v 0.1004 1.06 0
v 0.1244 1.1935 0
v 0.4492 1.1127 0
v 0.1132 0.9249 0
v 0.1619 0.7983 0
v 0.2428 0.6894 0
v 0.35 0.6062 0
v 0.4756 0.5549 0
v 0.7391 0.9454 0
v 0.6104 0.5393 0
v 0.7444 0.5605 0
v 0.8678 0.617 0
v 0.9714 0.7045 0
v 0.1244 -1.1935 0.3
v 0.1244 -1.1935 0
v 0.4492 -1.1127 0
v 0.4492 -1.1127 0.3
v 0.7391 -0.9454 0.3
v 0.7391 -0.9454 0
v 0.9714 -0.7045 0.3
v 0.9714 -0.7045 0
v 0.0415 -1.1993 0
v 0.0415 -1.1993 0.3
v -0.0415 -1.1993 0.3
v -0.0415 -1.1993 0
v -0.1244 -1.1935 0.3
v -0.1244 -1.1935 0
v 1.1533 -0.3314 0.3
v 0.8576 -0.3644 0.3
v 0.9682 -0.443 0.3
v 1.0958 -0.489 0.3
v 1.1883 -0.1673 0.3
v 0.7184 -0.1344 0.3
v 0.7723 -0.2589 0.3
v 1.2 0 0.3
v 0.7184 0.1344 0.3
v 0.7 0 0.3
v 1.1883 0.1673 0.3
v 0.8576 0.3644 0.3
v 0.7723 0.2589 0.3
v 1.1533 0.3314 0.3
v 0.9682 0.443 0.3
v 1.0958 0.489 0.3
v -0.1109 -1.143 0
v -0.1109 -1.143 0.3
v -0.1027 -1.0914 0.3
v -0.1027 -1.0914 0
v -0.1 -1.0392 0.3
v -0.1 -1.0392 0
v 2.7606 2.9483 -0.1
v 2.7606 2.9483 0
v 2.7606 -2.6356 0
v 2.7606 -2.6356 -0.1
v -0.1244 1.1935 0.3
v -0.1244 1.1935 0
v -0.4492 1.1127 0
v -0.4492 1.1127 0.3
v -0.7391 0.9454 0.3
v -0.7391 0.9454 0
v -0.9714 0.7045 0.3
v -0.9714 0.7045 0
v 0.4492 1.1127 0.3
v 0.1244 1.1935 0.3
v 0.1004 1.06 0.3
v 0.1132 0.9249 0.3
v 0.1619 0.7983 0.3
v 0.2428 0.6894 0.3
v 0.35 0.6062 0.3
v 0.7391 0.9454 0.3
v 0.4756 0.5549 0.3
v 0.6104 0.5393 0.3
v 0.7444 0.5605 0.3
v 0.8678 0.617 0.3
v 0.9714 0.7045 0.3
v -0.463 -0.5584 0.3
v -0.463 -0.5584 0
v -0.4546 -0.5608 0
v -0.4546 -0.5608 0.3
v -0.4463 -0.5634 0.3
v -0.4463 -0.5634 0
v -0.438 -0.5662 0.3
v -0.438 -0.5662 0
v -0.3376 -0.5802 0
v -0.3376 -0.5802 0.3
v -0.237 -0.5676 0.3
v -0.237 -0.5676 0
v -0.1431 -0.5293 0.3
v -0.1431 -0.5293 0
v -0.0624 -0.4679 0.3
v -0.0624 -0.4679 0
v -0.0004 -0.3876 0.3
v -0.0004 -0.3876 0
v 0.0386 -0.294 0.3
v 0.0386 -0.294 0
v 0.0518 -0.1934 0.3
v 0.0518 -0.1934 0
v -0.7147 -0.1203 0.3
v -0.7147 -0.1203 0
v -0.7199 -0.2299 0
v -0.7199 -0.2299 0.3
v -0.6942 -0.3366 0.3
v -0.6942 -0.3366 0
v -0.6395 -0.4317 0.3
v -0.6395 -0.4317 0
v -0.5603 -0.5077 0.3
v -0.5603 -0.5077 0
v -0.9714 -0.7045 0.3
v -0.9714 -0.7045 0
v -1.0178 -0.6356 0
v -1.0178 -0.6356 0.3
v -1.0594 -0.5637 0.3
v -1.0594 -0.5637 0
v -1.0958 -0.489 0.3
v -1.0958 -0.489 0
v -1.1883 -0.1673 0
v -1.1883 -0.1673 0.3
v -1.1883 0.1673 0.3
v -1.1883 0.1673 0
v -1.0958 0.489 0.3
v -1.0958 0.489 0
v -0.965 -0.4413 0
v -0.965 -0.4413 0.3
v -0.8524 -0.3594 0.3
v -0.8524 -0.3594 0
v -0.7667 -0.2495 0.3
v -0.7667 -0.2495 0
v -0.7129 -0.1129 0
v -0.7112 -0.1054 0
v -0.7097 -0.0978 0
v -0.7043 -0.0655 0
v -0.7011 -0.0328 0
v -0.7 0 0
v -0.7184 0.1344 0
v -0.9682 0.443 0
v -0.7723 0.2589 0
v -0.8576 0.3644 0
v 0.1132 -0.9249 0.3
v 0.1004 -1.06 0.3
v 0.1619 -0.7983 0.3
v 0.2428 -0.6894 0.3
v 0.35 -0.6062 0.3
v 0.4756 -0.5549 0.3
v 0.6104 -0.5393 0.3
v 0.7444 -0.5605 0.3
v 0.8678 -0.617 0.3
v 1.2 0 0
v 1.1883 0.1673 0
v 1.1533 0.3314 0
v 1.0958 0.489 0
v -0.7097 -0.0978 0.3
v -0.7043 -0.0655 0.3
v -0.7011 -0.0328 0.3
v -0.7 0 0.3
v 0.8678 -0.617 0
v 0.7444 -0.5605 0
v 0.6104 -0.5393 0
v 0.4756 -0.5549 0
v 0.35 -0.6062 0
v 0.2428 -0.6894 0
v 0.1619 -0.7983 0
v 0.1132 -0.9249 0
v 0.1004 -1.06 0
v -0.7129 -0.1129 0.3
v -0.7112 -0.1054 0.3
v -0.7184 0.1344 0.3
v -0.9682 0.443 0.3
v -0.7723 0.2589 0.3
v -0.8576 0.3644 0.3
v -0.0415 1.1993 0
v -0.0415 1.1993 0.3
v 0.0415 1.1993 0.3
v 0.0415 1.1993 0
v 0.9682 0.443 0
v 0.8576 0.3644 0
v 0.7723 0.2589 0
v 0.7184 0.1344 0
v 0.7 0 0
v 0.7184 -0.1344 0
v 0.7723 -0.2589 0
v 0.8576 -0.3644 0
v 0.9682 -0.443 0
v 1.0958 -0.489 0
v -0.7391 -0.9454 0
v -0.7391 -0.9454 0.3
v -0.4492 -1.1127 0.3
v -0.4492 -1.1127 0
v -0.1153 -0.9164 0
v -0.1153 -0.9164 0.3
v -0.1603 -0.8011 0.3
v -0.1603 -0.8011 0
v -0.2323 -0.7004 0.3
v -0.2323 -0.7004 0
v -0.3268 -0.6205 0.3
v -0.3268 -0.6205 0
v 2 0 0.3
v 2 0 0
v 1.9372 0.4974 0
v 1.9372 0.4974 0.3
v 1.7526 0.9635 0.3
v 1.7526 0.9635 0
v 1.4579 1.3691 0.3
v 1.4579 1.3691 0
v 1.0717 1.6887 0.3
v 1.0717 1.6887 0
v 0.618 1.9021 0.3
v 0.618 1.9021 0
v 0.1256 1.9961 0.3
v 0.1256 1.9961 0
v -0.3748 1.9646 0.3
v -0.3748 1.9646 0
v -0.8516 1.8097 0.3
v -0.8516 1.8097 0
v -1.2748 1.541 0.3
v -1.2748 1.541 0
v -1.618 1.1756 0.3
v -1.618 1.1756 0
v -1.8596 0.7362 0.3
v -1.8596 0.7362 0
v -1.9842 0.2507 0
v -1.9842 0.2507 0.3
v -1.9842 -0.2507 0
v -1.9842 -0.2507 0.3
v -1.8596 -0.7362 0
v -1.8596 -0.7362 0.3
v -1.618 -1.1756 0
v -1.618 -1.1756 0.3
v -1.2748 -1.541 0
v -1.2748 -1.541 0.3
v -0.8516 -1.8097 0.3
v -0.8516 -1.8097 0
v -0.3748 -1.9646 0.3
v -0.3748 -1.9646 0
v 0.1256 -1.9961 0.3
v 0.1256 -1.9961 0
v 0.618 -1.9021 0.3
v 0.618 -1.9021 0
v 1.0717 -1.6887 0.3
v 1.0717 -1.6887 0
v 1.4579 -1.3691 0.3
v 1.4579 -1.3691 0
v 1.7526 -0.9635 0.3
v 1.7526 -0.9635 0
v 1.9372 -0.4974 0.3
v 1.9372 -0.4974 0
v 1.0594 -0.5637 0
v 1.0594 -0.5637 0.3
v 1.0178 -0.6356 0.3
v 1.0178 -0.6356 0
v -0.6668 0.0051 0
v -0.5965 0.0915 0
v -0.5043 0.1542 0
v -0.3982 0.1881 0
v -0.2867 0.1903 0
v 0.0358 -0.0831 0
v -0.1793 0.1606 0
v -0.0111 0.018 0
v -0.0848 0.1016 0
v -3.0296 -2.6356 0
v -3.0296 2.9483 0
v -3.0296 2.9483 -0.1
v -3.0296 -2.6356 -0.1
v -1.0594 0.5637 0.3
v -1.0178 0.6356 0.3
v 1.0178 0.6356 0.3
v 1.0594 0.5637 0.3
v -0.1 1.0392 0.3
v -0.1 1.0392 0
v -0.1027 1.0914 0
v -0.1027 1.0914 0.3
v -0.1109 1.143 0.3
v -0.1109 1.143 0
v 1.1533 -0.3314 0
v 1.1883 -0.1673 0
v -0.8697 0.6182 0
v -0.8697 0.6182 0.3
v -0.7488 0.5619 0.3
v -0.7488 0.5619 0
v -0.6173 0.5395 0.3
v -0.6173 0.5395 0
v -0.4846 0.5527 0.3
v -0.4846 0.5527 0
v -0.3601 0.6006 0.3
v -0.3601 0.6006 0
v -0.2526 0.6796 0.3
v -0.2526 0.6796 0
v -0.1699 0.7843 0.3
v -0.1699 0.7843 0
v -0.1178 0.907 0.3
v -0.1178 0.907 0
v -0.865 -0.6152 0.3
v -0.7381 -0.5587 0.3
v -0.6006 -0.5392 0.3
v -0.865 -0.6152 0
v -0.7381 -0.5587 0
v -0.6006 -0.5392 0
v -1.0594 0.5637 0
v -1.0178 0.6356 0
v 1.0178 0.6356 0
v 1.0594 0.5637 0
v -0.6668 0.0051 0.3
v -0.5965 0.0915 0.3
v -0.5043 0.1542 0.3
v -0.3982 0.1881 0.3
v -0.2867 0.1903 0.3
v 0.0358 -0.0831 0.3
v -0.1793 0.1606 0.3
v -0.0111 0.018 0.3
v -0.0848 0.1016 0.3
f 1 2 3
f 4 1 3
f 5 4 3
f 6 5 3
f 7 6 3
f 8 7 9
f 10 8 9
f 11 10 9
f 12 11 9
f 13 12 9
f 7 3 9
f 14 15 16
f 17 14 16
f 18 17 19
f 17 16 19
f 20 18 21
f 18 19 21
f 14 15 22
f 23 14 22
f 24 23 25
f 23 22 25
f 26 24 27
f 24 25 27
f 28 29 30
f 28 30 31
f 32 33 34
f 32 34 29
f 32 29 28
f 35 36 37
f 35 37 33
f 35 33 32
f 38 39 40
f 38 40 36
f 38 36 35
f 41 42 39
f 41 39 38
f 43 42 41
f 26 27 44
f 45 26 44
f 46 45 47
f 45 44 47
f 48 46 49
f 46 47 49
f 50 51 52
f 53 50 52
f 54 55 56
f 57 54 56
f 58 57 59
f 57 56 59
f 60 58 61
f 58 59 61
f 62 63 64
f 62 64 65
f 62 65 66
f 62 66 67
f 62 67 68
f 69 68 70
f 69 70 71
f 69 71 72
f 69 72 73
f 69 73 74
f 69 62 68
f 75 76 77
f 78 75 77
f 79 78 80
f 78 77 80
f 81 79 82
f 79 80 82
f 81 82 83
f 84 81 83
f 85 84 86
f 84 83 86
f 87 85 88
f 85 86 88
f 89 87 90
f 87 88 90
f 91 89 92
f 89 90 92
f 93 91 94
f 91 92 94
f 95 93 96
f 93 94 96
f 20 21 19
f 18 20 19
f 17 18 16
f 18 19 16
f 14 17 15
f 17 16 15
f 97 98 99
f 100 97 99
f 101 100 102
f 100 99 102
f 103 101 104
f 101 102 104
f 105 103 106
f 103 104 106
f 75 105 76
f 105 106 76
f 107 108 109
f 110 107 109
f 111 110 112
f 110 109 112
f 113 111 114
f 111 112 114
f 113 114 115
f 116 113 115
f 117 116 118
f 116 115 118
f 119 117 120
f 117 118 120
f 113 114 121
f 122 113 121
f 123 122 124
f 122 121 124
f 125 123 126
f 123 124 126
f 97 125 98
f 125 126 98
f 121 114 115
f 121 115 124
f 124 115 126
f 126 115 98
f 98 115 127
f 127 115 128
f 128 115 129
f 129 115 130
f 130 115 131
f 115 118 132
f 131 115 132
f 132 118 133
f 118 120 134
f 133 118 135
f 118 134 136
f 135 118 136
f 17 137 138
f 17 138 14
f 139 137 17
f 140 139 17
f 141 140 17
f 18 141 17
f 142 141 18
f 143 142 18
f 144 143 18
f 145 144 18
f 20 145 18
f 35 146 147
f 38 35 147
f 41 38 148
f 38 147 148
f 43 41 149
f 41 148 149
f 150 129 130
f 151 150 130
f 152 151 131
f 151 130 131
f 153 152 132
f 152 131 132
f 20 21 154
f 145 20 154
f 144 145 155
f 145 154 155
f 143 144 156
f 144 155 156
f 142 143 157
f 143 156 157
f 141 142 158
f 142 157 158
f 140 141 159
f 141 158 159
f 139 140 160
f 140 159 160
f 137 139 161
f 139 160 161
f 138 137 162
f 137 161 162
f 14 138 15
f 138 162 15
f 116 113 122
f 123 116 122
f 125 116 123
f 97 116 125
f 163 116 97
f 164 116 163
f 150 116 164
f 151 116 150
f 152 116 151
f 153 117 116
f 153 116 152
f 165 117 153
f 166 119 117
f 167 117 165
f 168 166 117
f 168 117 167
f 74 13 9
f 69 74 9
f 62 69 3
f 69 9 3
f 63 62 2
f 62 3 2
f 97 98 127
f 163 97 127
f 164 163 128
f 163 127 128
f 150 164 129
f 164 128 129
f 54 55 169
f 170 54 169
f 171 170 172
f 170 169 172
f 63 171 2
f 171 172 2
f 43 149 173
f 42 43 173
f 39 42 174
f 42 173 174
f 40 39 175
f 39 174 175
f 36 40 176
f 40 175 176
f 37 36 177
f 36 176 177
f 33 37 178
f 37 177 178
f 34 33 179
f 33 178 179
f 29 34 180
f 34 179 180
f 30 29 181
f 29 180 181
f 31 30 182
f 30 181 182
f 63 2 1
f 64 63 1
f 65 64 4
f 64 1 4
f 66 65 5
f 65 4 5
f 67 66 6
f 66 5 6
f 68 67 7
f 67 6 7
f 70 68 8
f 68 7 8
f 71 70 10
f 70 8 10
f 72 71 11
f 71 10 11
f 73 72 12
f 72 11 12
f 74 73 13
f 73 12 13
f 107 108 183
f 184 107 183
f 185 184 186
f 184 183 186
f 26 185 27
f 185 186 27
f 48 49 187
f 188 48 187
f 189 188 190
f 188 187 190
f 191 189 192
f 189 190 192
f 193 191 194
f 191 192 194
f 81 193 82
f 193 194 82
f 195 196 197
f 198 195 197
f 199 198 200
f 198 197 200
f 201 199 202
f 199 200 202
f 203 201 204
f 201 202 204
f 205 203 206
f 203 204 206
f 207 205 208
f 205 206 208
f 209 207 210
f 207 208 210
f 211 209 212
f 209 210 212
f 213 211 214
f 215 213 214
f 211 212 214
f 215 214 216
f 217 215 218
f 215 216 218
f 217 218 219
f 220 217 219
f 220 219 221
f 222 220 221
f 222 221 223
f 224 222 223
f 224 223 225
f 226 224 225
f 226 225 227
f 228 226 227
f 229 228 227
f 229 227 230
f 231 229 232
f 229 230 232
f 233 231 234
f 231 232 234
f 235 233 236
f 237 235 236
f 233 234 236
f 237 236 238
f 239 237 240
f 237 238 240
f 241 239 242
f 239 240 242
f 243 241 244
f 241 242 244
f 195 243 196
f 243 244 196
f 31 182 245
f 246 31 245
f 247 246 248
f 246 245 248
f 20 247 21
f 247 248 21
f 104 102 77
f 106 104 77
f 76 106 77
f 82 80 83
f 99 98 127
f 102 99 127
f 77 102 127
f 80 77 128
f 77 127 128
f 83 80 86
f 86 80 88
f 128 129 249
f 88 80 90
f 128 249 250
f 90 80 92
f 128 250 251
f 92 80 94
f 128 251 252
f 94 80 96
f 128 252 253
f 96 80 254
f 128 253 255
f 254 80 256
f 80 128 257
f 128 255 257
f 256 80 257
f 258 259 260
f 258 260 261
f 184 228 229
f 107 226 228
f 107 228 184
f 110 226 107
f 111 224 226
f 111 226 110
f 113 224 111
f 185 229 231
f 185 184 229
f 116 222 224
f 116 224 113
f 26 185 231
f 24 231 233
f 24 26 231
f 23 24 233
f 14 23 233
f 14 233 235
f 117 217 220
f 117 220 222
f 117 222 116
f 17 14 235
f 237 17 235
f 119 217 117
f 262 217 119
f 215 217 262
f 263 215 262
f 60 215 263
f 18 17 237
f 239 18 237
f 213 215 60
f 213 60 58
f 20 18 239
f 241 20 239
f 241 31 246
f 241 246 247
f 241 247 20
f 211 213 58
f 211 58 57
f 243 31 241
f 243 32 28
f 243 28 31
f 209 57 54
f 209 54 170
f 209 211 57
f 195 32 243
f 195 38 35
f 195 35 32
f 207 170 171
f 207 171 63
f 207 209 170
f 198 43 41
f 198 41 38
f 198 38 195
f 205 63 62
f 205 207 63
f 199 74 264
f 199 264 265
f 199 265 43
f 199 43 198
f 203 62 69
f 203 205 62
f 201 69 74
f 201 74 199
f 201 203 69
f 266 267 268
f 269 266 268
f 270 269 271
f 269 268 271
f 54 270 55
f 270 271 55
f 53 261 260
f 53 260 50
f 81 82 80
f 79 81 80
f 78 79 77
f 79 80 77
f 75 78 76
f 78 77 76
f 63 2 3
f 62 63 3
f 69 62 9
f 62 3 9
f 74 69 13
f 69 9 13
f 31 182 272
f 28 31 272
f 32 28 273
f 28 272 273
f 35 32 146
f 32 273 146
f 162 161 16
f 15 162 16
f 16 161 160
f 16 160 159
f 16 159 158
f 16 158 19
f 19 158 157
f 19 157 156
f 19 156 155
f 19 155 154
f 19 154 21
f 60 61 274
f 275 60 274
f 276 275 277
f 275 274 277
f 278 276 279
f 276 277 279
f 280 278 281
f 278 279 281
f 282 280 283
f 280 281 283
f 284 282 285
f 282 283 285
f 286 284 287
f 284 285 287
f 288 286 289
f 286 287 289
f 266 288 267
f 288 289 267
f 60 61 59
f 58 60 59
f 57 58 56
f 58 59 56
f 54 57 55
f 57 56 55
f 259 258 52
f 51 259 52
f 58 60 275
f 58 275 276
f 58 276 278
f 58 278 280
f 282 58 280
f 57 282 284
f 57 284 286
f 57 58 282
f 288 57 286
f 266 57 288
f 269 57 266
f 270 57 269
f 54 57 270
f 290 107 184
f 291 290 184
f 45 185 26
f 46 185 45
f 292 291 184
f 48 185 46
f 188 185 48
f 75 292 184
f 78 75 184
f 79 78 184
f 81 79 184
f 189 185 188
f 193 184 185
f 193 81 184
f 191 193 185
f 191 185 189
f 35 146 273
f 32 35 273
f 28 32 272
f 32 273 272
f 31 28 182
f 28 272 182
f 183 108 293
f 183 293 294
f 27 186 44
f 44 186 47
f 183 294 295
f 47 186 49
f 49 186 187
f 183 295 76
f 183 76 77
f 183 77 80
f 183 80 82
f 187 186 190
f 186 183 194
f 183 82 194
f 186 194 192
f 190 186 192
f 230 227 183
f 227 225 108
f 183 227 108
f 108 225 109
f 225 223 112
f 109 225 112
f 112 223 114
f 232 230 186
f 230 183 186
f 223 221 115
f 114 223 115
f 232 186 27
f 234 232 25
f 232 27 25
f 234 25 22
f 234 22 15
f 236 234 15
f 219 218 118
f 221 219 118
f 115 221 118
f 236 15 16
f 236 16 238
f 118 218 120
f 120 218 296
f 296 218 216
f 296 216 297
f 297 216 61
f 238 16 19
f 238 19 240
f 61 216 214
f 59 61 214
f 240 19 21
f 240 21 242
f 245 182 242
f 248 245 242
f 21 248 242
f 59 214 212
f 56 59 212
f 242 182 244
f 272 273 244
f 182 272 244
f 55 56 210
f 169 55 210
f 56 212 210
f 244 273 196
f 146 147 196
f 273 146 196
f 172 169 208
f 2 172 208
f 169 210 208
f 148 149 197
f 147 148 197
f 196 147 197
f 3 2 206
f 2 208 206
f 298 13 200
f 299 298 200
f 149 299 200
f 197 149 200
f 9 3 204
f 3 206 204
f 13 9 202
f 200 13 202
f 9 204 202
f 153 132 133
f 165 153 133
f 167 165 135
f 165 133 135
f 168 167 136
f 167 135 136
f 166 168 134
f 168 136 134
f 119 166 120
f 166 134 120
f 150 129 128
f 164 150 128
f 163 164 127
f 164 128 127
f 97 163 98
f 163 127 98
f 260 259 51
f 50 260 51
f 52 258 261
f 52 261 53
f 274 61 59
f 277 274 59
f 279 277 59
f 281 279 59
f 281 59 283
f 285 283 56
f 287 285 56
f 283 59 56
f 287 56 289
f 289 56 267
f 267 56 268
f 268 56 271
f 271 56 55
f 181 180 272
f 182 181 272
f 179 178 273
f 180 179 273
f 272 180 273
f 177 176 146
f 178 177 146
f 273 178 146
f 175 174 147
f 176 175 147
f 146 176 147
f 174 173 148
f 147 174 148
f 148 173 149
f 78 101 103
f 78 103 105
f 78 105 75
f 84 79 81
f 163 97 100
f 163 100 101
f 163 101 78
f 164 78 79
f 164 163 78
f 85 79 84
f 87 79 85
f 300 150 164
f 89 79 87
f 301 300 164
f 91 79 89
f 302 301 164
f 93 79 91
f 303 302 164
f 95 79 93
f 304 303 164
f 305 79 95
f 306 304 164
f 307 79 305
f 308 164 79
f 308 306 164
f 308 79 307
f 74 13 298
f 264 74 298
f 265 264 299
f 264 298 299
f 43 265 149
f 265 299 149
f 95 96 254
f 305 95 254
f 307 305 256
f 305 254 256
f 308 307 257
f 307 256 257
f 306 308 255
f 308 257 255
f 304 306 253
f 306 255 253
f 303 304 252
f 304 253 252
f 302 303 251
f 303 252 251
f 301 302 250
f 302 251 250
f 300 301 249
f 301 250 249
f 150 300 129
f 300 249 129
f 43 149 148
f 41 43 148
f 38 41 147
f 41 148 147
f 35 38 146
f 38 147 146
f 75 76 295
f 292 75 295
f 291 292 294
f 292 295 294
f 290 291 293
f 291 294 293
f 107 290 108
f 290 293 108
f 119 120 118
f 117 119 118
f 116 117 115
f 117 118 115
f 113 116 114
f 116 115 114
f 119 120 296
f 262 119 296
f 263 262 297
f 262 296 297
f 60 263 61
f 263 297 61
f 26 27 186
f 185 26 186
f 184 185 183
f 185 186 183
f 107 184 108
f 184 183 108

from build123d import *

# Parameters (mm, degrees)
F1_DEPTH = 0.3
F0_R     = 2
F2_DEPTH = 0.3
F3_DEPTH = 0.3
F5_W     = 5.7901758701
F5_H     = 5.5838446133
F6_DEPTH = 0.1


# Not quite as in the source:
# - a feature of the source that left no trace in its solid (it failed there, or was rolled back) is left out


with BuildPart() as f1:
    # F0 (on Top) → F1 (new body)
    with BuildSketch(Plane.XY):
        with BuildLine():
            ThreePointArc((-0.7096651668, -0.0978353275), (-0.7024221585, -0.04915579), (-0.7, 0))
            ThreePointArc((-0.7, 0), (-0.8113592061, 0.3145764348), (-1.0958333333, 0.4890289414))
            ThreePointArc((-1.0958333333, 0.4890289414), (-1.2, 0), (-1.0958333333, -0.4890289414))
            ThreePointArc((-1.0958333333, -0.4890289414), (-0.8523553963, -0.3593650366), (-0.7146924586, -0.1203187029))
            ThreePointArc((-0.7146924586, -0.1203187029), (-0.7123462626, -0.1090395733), (-0.7096651668, -0.0978353275))
        make_face()
        with BuildLine():
            ThreePointArc((-0.7146924586, -0.1203187029), (-0.7120492993, -0.1091059745), (-0.7096651668, -0.0978353275))
            ThreePointArc((-0.7096651668, -0.0978353275), (-0.7123462626, -0.1090395733), (-0.7146924586, -0.1203187029))
        make_face()
    extrude(amount=F1_DEPTH)


with BuildPart() as f1b:
    # F0 (on Top) → F1, piece 2 (new body)
    with BuildSketch(Plane.XY):
        with BuildLine():
            ThreePointArc((-0.1244051802, 1.1935339757), (-0.6, 1.0392304845), (-0.9714281531, 0.7045050343))
            ThreePointArc((-0.9714281531, 0.7045050343), (-0.420715417, 0.5724789036), (-0.1, 1.0392304845))
            ThreePointArc((-0.1, 1.0392304845), (-0.1061389822, 1.1173412716), (-0.1244051802, 1.1935339757))
        make_face()
    extrude(amount=F1_DEPTH)


with BuildPart() as f1c:
    # F0 (on Top) → F1, piece 3 (new body)
    with BuildSketch(Plane.XY):
        with BuildLine():
            ThreePointArc((-0.46298597, -0.5583696361), (-0.7381172832, -0.5586853607), (-0.9714281531, -0.7045050343))
            ThreePointArc((-0.9714281531, -0.7045050343), (-0.6, -1.0392304845), (-0.1244051802, -1.1935339757))
            ThreePointArc((-0.1244051802, -1.1935339757), (-0.1061389822, -1.1173412716), (-0.1, -1.0392304845))
            ThreePointArc((-0.1, -1.0392304845), (-0.1931954282, -0.748524378), (-0.4380401615, -0.5661881918))
            ThreePointArc((-0.4380401615, -0.5661881918), (-0.4505791453, -0.5624897467), (-0.46298597, -0.5583696361))
        make_face()
        with BuildLine():
            ThreePointArc((-0.4380401615, -0.5661881918), (-0.4504619581, -0.5621158505), (-0.46298597, -0.5583696361))
            ThreePointArc((-0.46298597, -0.5583696361), (-0.4505791453, -0.5624897467), (-0.4380401615, -0.5661881918))
        make_face()
    extrude(amount=F1_DEPTH)


with BuildPart() as f1d:
    # F0 (on Top) → F1, piece 4 (new body)
    with BuildSketch(Plane.XY):
        with BuildLine():
            ThreePointArc((1.1, 1.0392304845), (0.678110787, 1.5330915024), (0.1244051802, 1.1935339757))
            ThreePointArc((0.1244051802, 1.1935339757), (0.6, 1.0392304845), (0.9714281531, 0.7045050343))
            ThreePointArc((0.9714281531, 0.7045050343), (1.0667515809, 0.8599459015), (1.1, 1.0392304845))
        make_face()
    extrude(amount=F1_DEPTH)



with BuildPart() as f1e:
    # F0 (on Top) → F1, piece 5 (new body)
    with BuildSketch(Plane.XY):
        with BuildLine():
            ThreePointArc((0.9714281531, -0.7045050343), (0.6, -1.0392304845), (0.1244051802, -1.1935339757))
            ThreePointArc((0.1244051802, -1.1935339757), (0.678110787, -1.5330915024), (1.1, -1.0392304845))
            ThreePointArc((1.1, -1.0392304845), (1.0667515809, -0.8599459015), (0.9714281531, -0.7045050343))
        make_face()
    extrude(amount=F1_DEPTH)


with BuildPart() as f1f:
    # F0 (on Top) → F1, piece 6 (new body)
    with BuildSketch(Plane.XY):
        with BuildLine():
            ThreePointArc((1.2, 0), (1.1736694594, 0.25), (1.0958333333, 0.4890289414))
            ThreePointArc((1.0958333333, 0.4890289414), (0.7, 0), (1.0958333333, -0.4890289414))
            ThreePointArc((1.0958333333, -0.4890289414), (1.1736694594, -0.25), (1.2, 0))
        make_face()
    extrude(amount=F1_DEPTH)


with BuildPart() as f1d_1:
    add(f1d.part)

    add(f1e.part)  # F2 merges F1e
    # F0 (on Top) → F2 (join)
    with BuildSketch(Plane.XY):
        Circle(F0_R)
        with BuildLine():
            ThreePointArc((-1.0958333333, -0.4890289414), (-1.7, 0), (-1.0958333333, 0.4890289414))
            ThreePointArc((-1.0958333333, 0.4890289414), (-1.0392304845, 0.6), (-0.9714281531, 0.7045050343))
            ThreePointArc((-0.9714281531, 0.7045050343), (-0.85, 1.4722431864), (-0.1244051802, 1.1935339757))
            ThreePointArc((-0.1244051802, 1.1935339757), (0, 1.2), (0.1244051802, 1.1935339757))
            ThreePointArc((0.1244051802, 1.1935339757), (0.678110787, 1.5330915024), (1.1, 1.0392304845))
            ThreePointArc((1.1, 1.0392304845), (1.0667515809, 0.8599459015), (0.9714281531, 0.7045050343))
            ThreePointArc((0.9714281531, 0.7045050343), (1.0392304845, 0.6), (1.0958333333, 0.4890289414))
            ThreePointArc((1.0958333333, 0.4890289414), (1.5145764348, 0.3886407939), (1.7, 0))
            ThreePointArc((1.7, 0), (1.5145764348, -0.3886407939), (1.0958333333, -0.4890289414))
            ThreePointArc((1.0958333333, -0.4890289414), (1.0392304845, -0.6), (0.9714281531, -0.7045050343))
            ThreePointArc((0.9714281531, -0.7045050343), (1.0667515809, -0.8599459015), (1.1, -1.0392304845))
            ThreePointArc((1.1, -1.0392304845), (0.678110787, -1.5330915024), (0.1244051802, -1.1935339757))
            ThreePointArc((0.1244051802, -1.1935339757), (0, -1.2), (-0.1244051802, -1.1935339757))
            ThreePointArc((-0.1244051802, -1.1935339757), (-0.85, -1.4722431864), (-0.9714281531, -0.7045050343))
            ThreePointArc((-0.9714281531, -0.7045050343), (-1.0392304845, -0.6), (-1.0958333333, -0.4890289414))
        make_face(mode=Mode.SUBTRACT)
        with BuildLine():
            ThreePointArc((-1.0958333333, -0.4890289414), (-1.2, 0), (-1.0958333333, 0.4890289414))
            ThreePointArc((-1.0958333333, 0.4890289414), (-1.7, 0), (-1.0958333333, -0.4890289414))
        make_face()
        with BuildLine():
            ThreePointArc((-0.1244051802, -1.1935339757), (-0.6, -1.0392304845), (-0.9714281531, -0.7045050343))
            ThreePointArc((-0.9714281531, -0.7045050343), (-0.85, -1.4722431864), (-0.1244051802, -1.1935339757))
        make_face()
        with BuildLine():
            ThreePointArc((1.7, 0), (1.5145764348, 0.3886407939), (1.0958333333, 0.4890289414))
            ThreePointArc((1.0958333333, 0.4890289414), (1.1736694594, 0.25), (1.2, 0))
            ThreePointArc((1.2, 0), (1.1736694594, -0.25), (1.0958333333, -0.4890289414))
            ThreePointArc((1.0958333333, -0.4890289414), (1.5145764348, -0.3886407939), (1.7, 0))
        make_face()
        with BuildLine():
            ThreePointArc((-0.1244051802, 1.1935339757), (-0.85, 1.4722431864), (-0.9714281531, 0.7045050343))
            ThreePointArc((-0.9714281531, 0.7045050343), (-0.6, 1.0392304845), (-0.1244051802, 1.1935339757))
        make_face()
    extrude(amount=F2_DEPTH)


with BuildPart() as f2:
    # F0 (on Top) → F2, piece 2 (new body)
    with BuildSketch(Plane.XY):
        with BuildLine():
            ThreePointArc((0.9714281531, -0.7045050343), (0.35, -0.6062177826), (0.1244051802, -1.1935339757))
            ThreePointArc((0.1244051802, -1.1935339757), (0.6, -1.0392304845), (0.9714281531, -0.7045050343))
        make_face()
    extrude(amount=F2_DEPTH)


with BuildPart() as f2b:
    # F0 (on Top) → F2, piece 3 (new body)
    with BuildSketch(Plane.XY):
        with BuildLine():
            ThreePointArc((0.9714281531, 0.7045050343), (0.6, 1.0392304845), (0.1244051802, 1.1935339757))
            ThreePointArc((0.1244051802, 1.1935339757), (0.35, 0.6062177826), (0.9714281531, 0.7045050343))
        make_face()
    extrude(amount=F2_DEPTH)


with BuildPart() as f3:
    # F0 (on Top) → F3 (new body)
    with BuildSketch(Plane.XY):
        with BuildLine():
            ThreePointArc((0.0518479844, -0.1934346327), (-0.2867344533, 0.1903105649), (-0.7096651668, -0.0978353275))
            ThreePointArc((-0.7096651668, -0.0978353275), (-0.7120492993, -0.1091059745), (-0.7146924586, -0.1203187029))
            ThreePointArc((-0.7146924586, -0.1203187029), (-0.6702487628, -0.3861225462), (-0.46298597, -0.5583696361))
            ThreePointArc((-0.46298597, -0.5583696361), (-0.4504619581, -0.5621158505), (-0.4380401615, -0.5661881918))
            ThreePointArc((-0.4380401615, -0.5661881918), (-0.1007143125, -0.5012233635), (0.0518479844, -0.1934346327))
        make_face()
    extrude(amount=F3_DEPTH)


with BuildPart() as f6:
    # F5 (on face) → F6 (new body)
    with BuildSketch(Plane(origin=(0, 0, 0), x_dir=(1, 0, 0), z_dir=(0, 0, -1))):
        with Locations((-0.1344780903, -0.1563602127)):
            Rectangle(F5_W, F5_H)
    extrude(amount=F6_DEPTH)


solid = Compound([f1.part, f1b.part, f1c.part, f1f.part, f1d_1.part, f2.part, f2b.part, f3.part, f6.part])
